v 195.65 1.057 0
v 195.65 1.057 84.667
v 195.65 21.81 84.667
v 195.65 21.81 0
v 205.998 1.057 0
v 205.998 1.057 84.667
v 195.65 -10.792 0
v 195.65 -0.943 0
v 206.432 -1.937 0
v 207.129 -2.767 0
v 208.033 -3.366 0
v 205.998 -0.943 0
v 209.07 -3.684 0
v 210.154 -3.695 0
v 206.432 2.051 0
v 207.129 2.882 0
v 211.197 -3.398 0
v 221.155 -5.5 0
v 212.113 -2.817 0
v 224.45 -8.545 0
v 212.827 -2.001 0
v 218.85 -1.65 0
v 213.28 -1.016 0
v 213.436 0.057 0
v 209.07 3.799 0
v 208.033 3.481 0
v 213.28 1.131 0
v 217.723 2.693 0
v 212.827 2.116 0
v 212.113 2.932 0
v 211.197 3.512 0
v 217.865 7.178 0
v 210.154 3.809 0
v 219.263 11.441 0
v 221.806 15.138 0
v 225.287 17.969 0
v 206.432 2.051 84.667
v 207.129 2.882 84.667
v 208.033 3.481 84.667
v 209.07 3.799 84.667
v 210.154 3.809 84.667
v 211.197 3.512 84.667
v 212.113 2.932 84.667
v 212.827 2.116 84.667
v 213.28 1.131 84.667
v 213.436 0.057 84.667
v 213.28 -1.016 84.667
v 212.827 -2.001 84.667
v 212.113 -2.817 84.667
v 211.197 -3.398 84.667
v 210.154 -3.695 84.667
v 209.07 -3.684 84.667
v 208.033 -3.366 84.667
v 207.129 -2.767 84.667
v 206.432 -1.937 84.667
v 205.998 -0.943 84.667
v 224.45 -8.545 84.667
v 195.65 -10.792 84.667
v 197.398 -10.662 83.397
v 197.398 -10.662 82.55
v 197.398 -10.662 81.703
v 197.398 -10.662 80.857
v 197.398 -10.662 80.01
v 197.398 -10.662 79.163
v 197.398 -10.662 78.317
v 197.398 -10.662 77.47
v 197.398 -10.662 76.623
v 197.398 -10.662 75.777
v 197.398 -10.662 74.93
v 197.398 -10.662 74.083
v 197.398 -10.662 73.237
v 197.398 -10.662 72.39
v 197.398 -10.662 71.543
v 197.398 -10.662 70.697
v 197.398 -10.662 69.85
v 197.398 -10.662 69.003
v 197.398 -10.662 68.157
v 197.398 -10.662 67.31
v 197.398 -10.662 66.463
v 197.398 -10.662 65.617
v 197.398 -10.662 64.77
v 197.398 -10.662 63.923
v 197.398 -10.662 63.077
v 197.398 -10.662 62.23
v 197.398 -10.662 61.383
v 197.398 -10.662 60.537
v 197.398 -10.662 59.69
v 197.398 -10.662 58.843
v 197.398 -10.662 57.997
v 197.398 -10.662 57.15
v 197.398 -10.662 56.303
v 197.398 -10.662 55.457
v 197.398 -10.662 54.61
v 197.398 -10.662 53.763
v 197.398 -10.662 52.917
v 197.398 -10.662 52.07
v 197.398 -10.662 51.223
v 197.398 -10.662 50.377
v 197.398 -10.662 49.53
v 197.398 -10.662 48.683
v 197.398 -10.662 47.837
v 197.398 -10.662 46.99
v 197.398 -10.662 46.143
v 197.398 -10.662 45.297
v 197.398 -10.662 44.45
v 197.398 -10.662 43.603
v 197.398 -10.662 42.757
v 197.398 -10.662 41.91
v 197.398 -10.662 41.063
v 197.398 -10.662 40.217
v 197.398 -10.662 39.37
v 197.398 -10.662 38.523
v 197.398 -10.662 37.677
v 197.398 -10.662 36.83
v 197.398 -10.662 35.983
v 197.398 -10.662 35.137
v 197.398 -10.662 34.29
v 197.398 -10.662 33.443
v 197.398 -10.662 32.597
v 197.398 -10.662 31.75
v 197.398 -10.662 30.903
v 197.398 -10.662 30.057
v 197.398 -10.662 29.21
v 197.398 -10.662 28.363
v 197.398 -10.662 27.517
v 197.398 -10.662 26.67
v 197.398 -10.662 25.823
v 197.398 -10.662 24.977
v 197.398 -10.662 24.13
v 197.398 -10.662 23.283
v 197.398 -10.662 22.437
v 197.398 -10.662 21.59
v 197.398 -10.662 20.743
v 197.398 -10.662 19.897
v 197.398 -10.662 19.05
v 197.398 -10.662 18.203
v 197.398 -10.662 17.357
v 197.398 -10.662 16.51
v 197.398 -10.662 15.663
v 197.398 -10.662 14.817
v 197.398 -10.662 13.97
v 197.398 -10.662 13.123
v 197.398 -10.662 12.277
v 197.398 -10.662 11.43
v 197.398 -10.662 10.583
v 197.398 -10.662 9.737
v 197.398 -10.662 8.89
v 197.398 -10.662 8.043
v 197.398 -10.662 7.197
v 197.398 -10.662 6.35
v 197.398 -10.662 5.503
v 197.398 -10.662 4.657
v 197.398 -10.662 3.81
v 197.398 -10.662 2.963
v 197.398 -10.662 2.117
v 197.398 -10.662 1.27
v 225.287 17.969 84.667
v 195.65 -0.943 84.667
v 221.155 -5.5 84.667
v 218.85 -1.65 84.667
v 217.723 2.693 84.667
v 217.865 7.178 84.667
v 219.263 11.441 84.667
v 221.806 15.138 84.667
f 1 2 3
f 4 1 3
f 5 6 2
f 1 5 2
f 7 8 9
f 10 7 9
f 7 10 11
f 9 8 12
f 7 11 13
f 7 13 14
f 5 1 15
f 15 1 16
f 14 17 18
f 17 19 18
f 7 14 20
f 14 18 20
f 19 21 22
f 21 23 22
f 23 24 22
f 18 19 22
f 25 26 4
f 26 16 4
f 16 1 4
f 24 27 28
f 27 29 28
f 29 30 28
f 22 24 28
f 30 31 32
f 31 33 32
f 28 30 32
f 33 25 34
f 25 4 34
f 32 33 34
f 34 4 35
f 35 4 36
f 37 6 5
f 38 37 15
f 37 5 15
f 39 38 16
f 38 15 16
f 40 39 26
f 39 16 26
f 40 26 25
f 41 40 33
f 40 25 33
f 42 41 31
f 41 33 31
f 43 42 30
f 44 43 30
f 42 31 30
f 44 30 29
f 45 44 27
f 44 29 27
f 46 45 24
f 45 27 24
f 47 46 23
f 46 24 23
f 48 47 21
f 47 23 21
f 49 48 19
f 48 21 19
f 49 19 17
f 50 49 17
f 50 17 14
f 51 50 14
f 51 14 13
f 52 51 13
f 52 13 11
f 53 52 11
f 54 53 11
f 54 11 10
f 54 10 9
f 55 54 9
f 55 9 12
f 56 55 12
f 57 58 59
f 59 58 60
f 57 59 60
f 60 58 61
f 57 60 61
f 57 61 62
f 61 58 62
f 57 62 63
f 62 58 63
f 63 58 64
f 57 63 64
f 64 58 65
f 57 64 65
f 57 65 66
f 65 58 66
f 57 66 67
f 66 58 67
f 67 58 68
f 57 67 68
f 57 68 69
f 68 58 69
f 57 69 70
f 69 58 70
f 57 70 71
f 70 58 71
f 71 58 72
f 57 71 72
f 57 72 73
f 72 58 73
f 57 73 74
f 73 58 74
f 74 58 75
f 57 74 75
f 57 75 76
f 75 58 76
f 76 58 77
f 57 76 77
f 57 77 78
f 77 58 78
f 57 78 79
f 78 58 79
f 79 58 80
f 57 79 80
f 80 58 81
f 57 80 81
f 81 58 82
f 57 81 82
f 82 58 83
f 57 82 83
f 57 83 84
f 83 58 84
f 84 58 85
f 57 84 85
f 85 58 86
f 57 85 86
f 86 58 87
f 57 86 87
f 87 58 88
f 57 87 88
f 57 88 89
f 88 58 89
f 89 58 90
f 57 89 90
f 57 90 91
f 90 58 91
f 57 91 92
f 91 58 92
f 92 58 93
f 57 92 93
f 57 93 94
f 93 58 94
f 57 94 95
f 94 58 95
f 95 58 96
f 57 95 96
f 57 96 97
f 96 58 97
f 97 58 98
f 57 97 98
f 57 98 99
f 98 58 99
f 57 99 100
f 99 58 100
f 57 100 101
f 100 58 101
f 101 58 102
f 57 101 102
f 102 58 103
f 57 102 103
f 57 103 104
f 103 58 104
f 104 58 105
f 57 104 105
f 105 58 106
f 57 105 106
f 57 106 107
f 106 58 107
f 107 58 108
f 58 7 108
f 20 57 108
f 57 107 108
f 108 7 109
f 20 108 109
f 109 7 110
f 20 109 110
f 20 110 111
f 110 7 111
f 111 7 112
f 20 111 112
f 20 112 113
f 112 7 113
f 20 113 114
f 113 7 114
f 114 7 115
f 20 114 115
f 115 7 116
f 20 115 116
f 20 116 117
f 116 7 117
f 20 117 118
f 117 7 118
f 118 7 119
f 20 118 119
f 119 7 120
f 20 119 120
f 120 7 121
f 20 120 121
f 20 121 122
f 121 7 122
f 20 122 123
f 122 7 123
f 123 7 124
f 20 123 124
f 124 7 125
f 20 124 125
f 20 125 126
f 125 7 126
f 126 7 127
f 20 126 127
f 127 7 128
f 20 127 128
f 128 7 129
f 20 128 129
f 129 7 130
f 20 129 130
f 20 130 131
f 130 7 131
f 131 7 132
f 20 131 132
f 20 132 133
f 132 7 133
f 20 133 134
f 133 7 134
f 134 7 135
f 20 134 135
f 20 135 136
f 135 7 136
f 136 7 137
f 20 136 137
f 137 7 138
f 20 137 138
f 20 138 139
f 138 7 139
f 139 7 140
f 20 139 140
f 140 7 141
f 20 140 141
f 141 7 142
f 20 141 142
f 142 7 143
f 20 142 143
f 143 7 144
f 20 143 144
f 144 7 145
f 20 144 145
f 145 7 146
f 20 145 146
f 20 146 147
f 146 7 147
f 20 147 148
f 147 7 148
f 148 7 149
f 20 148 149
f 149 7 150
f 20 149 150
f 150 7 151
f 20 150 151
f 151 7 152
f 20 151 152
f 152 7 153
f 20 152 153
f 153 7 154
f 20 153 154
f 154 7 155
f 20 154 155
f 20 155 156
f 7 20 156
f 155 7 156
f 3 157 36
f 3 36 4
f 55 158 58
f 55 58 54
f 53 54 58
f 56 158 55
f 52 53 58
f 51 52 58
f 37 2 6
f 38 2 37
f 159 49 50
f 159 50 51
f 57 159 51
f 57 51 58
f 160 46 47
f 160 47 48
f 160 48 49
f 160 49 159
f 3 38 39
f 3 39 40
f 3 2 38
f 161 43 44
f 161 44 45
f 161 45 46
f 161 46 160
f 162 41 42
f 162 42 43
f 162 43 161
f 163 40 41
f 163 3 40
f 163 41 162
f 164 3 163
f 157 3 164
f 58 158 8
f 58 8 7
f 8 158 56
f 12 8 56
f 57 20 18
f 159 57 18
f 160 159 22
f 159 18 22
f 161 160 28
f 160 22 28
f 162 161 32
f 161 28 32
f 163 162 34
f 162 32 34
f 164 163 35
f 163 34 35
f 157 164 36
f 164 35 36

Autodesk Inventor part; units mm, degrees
ref_plane "YZ Plane" through (0, 0, 0) normal (1, 0, 0) x (0, 1, 0)
ref_plane "XZ Plane" through (0, 0, 0) normal (0, 1, 0) x (-1, 0, 0)
ref_plane "XY Plane" through (0, 0, 0) normal (0, 0, 1) x (1, 0, 0)
sketch "Sketch2" plane through (0, 0, 0) normal (0, 0, 1) x (1, 0, 0)
  spline S0 degree 5 poles (319.6498, 0.0573) (319.6501, 0.0612) (319.6024, 0.0717) (319.3745, 0.1032) (319.3587, 0.1577) (318.7204, 0.2502) (318.4411, 0.3675) (317.6227, 0.5236) (316.9347, 0.7102) (315.9239, 0.9334) (314.8763, 1.1861) (313.6258, 1.4728) (312.2675, 1.7887) (310.7514, 2.1347) (309.1071, 2.5099) (307.3204, 2.9131) (305.4017, 3.3421) (303.3481, 3.7974) (301.1639, 4.2757) (298.8502, 4.7782) (296.4092, 5.301) (293.8432, 5.8446) (291.1548, 6.4061) (288.3466, 6.9857) (285.4207, 7.5803) (282.3807, 8.1894) (279.2284, 8.8107) (275.968, 9.4437) (272.6016, 10.0865) (269.1329, 10.7361) (265.5656, 11.3942) (261.9019, 12.0551) (258.1469, 12.7207) (254.3029, 13.3883) (250.3742, 14.0555) (246.3647, 14.7217) (242.2776, 15.3854) (238.118, 16.0441) (233.8887, 16.6979) (229.5952, 17.3434) (225.2402, 17.981) (220.8297, 18.6074) (216.3658, 19.2226) (211.8552, 19.8242) (207.3009, 20.4107) (202.7077, 20.9813) (198.0804, 21.5339) (193.4232, 22.0679) (188.7413, 22.58) (184.0389, 23.0713) (179.321, 23.5382) (174.592, 23.982) (169.8567, 24.3971) (165.1201, 24.7874) (160.3872, 25.1472) (155.6604, 25.4776) (150.948, 25.7772) (146.2454, 26.0449) (141.5744, 26.278) (136.9015, 26.4795) (132.2479, 26.6311) (127.6319, 26.7393) (123.054, 26.7999) (118.5202, 26.8147) (114.0397, 26.7815) (109.6094, 26.7031) (105.2517, 26.5723) (100.9331, 26.4088) (96.7495, 26.1663) (92.5147, 25.9483) (88.6376, 25.5343) (84.2302, 25.3974) (81.2071, 24.5612) (76.5297, 24.5259) (73.18, 23.8676) (69.3619, 23.413) (65.9721, 22.8018) (62.3454, 22.244) (59.4319, 21.514) (55.4307, 21.0148) (53.2464, 20.1084) (49.5889, 19.537) (47.2944, 18.6473) (44.3884, 17.909) (41.914, 17.071) (39.4431, 16.2394) (37.1538, 15.3738) (34.9769, 14.4941) (32.9455, 13.5944) (31.0501, 12.6807) (29.2961, 11.7542) (27.6837, 10.8151) (26.2149, 9.8673) (24.8895, 8.9103) (23.7099, 7.9467) (22.6751, 6.976) (21.7868, 6.0004) (21.0458, 5.0186) (20.4526, 4.032) (20.0117, 3.0392) (19.7221, 2.0438) (19.5893, 1.0479) (19.6118, 0.0538) (19.7865, -0.9258) (20.1138, -1.8742) (20.591, -2.7944) (21.2165, -3.6796) (21.9855, -4.5321) (22.8956, -5.3514) (23.9453, -6.1385) (25.1332, -6.8944) (26.4582, -7.6188) (27.9184, -8.3123) (29.5136, -8.9751) (31.2409, -9.6071) (33.0997, -10.2067) (35.0892, -10.7758) (37.2002, -11.3131) (39.4562, -11.8174) (41.7927, -12.2939) (44.3651, -12.7275) (46.7744, -13.1584) (50.0005, -13.481) (52.1533, -13.8927) (55.9371, -14.1294) (58.2153, -14.4717) (61.732, -14.6854) (64.8012, -14.9153) (68.2287, -15.092) (71.6338, -15.2498) (75.1915, -15.3722) (78.8138, -15.4692) (82.5326, -15.5359) (86.3291, -15.5764) (90.2061, -15.5901) (94.1575, -15.5787) (98.1812, -15.5438) (102.2727, -15.4851) (106.4286, -15.4059) (110.6456, -15.3062) (114.9188, -15.1867) (119.2459, -15.0512) (123.6218, -14.8988) (128.0442, -14.7319) (132.5111, -14.552) (137.0141, -14.3592) (141.5621, -14.1606) (146.1675, -13.9403) (150.787, -13.7052) (155.434, -13.4523) (160.0951, -13.1857) (164.7676, -12.9046) (169.4465, -12.6129) (174.1261, -12.3082) (178.8033, -11.9955) (183.4722, -11.6727) (188.1294, -11.3426) (192.7696, -11.0072) (197.3886, -10.6641) (201.9818, -10.3188) (206.5448, -9.9678) (211.0728, -9.6157) (215.5623, -9.2611) (220.0069, -8.9047) (224.4048, -8.5497) (228.7492, -8.193) (233.0373, -7.8393) (237.2647, -7.4865) (241.4259, -7.1353) (245.5189, -6.7884) (249.5374, -6.4441) (253.4791, -6.104) (257.3389, -5.7683) (261.1136, -5.4376) (264.7987, -5.113) (268.3914, -4.7937) (271.8871, -4.4807) (275.2826, -4.1749) (278.5752, -3.8759) (281.7596, -3.585) (284.8354, -3.3021) (287.7962, -3.0278) (290.6419, -2.763) (293.3672, -2.5063) (295.9712, -2.2616) (298.4496, -2.0246) (300.8012, -1.801) (303.0222, -1.5859) (305.1122, -1.3849) (307.0656, -1.194) (308.8864, -1.0166) (310.5623, -0.8504) (312.1091, -0.6993) (313.4945, -0.5587) (314.7717, -0.4371) (315.8415, -0.3205) (316.8737, -0.2329) (317.5782, -0.1363) (318.4119, -0.0906) (318.7016, -0.0103) (319.3493, -0.0034) (319.3699, 0.0485) (319.6005, 0.0494) (319.6495, 0.0534) (319.6498, 0.0573) knots 0 0 0 0 0 0 0.001406 0.002637 0.004353 0.006443 0.008834 0.011487 0.014375 0.017478 0.020781 0.02427 0.027934 0.031762 0.035746 0.039878 0.044151 0.048559 0.053094 0.057751 0.062526 0.067412 0.072404 0.077499 0.082692 0.087977 0.093351 0.098811 0.104351 0.109968 0.115658 0.121418 0.127243 0.133131 0.139077 0.145079 0.151132 0.157233 0.163379 0.169567 0.175793 0.182054 0.188346 0.194667 0.201013 0.20738 0.213767 0.220168 0.226582 0.233004 0.239433 0.245864 0.252294 0.258721 0.265141 0.27155 0.27795 0.284339 0.290715 0.297074 0.303413 0.309725 0.316005 0.32225 0.328456 0.33462 0.340739 0.34681 0.352829 0.358735 0.364639 0.370482 0.376261 0.381971 0.38767 0.393236 0.398773 0.404177 0.409526 0.414755 0.419891 0.424884 0.429828 0.434638 0.439375 0.444 0.448512 0.452907 0.457182 0.461332 0.465356 0.469251 0.473017 0.476652 0.480158 0.48354 0.486805 0.489964 0.493033 0.496034 0.498989 0.501921 0.504852 0.507807 0.510807 0.513873 0.517028 0.520286 0.523658 0.527152 0.530771 0.534516 0.538388 0.542384 0.546503 0.550741 0.555095 0.559563 0.56414 0.568856 0.57364 0.578576 0.583553 0.588622 0.593747 0.598989 0.604262 0.609667 0.615146 0.620698 0.626318 0.632003 0.637751 0.643558 0.649421 0.655338 0.661304 0.667318 0.673375 0.679474 0.685611 0.691783 0.697987 0.704223 0.710491 0.716788 0.723111 0.729457 0.73582 0.742195 0.748576 0.754963 0.761351 0.767737 0.774118 0.780492 0.786854 0.793202 0.799533 0.805843 0.812129 0.818388 0.824617 0.830812 0.836971 0.843089 0.849164 0.855191 0.861169 0.867092 0.872959 0.878764 0.884505 0.890178 0.895778 0.901303 0.906749 0.91211 0.917384 0.922566 0.927651 0.932635 0.937513 0.942281 0.946932 0.951462 0.955865 0.960134 0.964263 0.968244 0.97207 0.975732 0.979219 0.982521 0.985624 0.988511 0.991164 0.993554 0.995643 0.997359 0.998591 1 1 1 1 1 1
  circle A0 centre (79.5135, 4.6359) radius 11.959
  line L0 (79.5135, 4.6359) -> (79.5135, 24.6083) construction
  circle A1 centre (209.6498, 0.0573) radius 3.7859
  line L1 (79.5135, 4.6359) -> (209.6498, 4.6359) construction
  line L2 (319.6498, 0.0573) -> (219.6498, 0.0573) construction
  line L3 (219.6499, 18.7671) -> (219.6499, -8.9327) construction
  line L4 (28.0055, 4.5054) -> (28.0055, -2.4946)
  line L5 (19.627, 1.0326) -> (319.6498, 0.0573) construction
  line L6 (49.7105, 14.4213) -> (55.6079, 14.4213)
  line L7 (49.7104, -8.4915) -> (55.6078, -8.4915)
  line L8 (28.0055, 4.5054) -> (49.7105, 14.4213)
  line L9 (28.0055, -2.4946) -> (49.7104, -8.4915)
  line L10 (55.6079, 14.4213) -> (55.6079, 20.8726)
  line L11 (55.6078, -8.4915) -> (55.6078, -14.1513)
  line L12 (108.6496, 16.398) -> (108.6496, -7.1261)
  line L13 (110.8735, -9.1136) -> (193.8736, 0.2359)
  line L14 (195.6498, 2.2233) -> (195.6498, 7.0486)
  line L15 (193.8736, 9.036) -> (110.8735, 18.3854)
  arc A2 (110.8735, 18.3854) -> (108.6496, 16.398) centre (110.6496, 16.398) ccw
  arc A3 (108.6496, -7.1261) -> (110.8735, -9.1136) centre (110.6496, -7.1261) ccw
  arc A4 (193.8736, 0.2359) -> (195.6498, 2.2233) centre (193.6498, 2.2233) ccw
  arc A5 (195.6498, 7.0486) -> (193.8736, 9.036) centre (193.6498, 7.0486) ccw
  arc A6 (225.2869, 17.9694) -> (224.4503, -8.5446) centre (233.3969, 4.4433) ccw
  line L16 (195.6498, 4.6359) -> (195.6498, -10.7925)
  line L17 (195.6498, 4.6359) -> (195.6498, 21.8096)
  point P0 (0, 0)
  point P1 (319.3573, 0.1272)
  point P2 (318.9918, 0.2142)
  point P3 (318.4802, 0.3354)
  point P4 (317.8238, 0.4911)
  point P5 (317.0222, 0.6801)
  point P6 (316.0769, 0.9024)
  point P7 (314.9885, 1.1568)
  point P8 (313.7582, 1.443)
  point P9 (312.3866, 1.7598)
  point P10 (310.8752, 2.1063)
  point P11 (309.2258, 2.4819)
  point P12 (307.4393, 2.8854)
  point P13 (305.5178, 3.3153)
  point P14 (303.4628, 3.7707)
  point P15 (301.2764, 4.2501)
  point P16 (298.9607, 4.7526)
  point P17 (296.5175, 5.2764)
  point P18 (293.9492, 5.8203)
  point P19 (291.2585, 6.3828)
  point P20 (288.4478, 6.9627)
  point P21 (285.5195, 7.5582)
  point P22 (282.4766, 8.1678)
  point P23 (279.3218, 8.79)
  point P24 (276.0584, 9.4236)
  point P25 (272.6891, 10.0668)
  point P26 (269.2175, 10.7178)
  point P27 (265.6469, 11.3757)
  point P28 (261.9803, 12.0381)
  point P29 (258.2219, 12.7041)
  point P30 (254.3747, 13.3722)
  point P31 (250.4426, 14.0403)
  point P32 (246.4295, 14.7072)
  point P33 (242.339, 15.3714)
  point P34 (238.1756, 16.0311)
  point P35 (233.9428, 16.6851)
  point P36 (229.6454, 17.3316)
  point P37 (220.8723, 18.5967)
  point P38 (216.4049, 19.2123)
  point P39 (211.8901, 19.8144)
  point P40 (207.332, 20.4015)
  point P41 (202.7347, 20.9724)
  point P42 (198.1034, 21.5256)
  point P43 (193.4423, 22.0596)
  point P44 (188.7563, 22.5726)
  point P45 (184.0499, 23.0637)
  point P46 (179.3279, 23.5314)
  point P47 (174.5948, 23.9745)
  point P48 (169.8554, 24.3909)
  point P49 (165.1148, 24.7803)
  point P50 (160.3775, 25.1406)
  point P51 (155.6479, 25.4709)
  point P52 (150.9316, 25.7703)
  point P53 (146.233, 26.0373)
  point P54 (141.557, 26.2707)
  point P55 (136.882, 26.4681)
  point P56 (132.2209, 26.6211)
  point P57 (127.5964, 26.7282)
  point P58 (123.0133, 26.7888)
  point P59 (118.4761, 26.8026)
  point P60 (113.9902, 26.7693)
  point P61 (109.5601, 26.6886)
  point P62 (105.191, 26.5611)
  point P63 (100.8866, 26.3866)
  point P64 (96.6524, 26.1647)
  point P65 (92.4927, 25.8975)
  point P66 (88.4121, 25.5832)
  point P67 (84.4152, 25.2282)
  point P68 (80.9052, 24.7441)
  point P69 (76.6873, 24.3761)
  point P70 (72.9635, 23.8905)
  point P71 (69.3402, 23.3611)
  point P72 (65.8208, 22.7938)
  point P73 (62.4086, 22.1883)
  point P74 (59.107, 21.5464)
  point P75 (52.8493, 20.1606)
  point P76 (49.7105, 19.4213)
  point P77 (47.0737, 18.6507)
  point P78 (44.3741, 17.8542)
  point P79 (41.8034, 17.0322)
  point P80 (39.3638, 16.1874)
  point P81 (37.0583, 15.3213)
  point P82 (34.8884, 14.4363)
  point P83 (32.8568, 13.534)
  point P84 (30.965, 12.6166)
  point P85 (29.2145, 11.686)
  point P86 (27.6071, 10.7437)
  point P87 (26.1443, 9.7921)
  point P88 (24.8269, 8.8324)
  point P89 (23.6566, 7.8664)
  point P90 (22.6336, 6.8953)
  point P91 (21.7591, 5.9209)
  point P92 (21.0334, 4.9441)
  point P93 (20.4571, 3.9661)
  point P94 (20.0308, 2.9875)
  point P95 (19.7539, 2.0098)
  point P96 (19.6496, 0.0573)
  point P97 (19.8205, -0.9033)
  point P98 (20.1376, -1.8357)
  point P99 (20.6002, -2.7402)
  point P100 (21.208, -3.6159)
  point P101 (21.9598, -4.4628)
  point P102 (22.8544, -5.2806)
  point P103 (23.8909, -6.069)
  point P104 (25.0681, -6.8277)
  point P105 (26.3846, -7.5561)
  point P106 (27.8384, -8.2539)
  point P107 (29.4284, -8.9211)
  point P108 (31.1522, -9.5571)
  point P109 (33.0086, -10.1613)
  point P110 (34.9949, -10.734)
  point P111 (37.1093, -11.2746)
  point P112 (39.3497, -11.7828)
  point P113 (41.7134, -12.2586)
  point P114 (44.198, -12.702)
  point P115 (46.8014, -13.1127)
  point P116 (49.7104, -13.4915)
  point P117 (52.3532, -13.8357)
  point P118 (58.3469, -14.4294)
  point P119 (61.5023, -14.6781)
  point P120 (64.7591, -14.8953)
  point P121 (68.1149, -15.0813)
  point P122 (71.5661, -15.237)
  point P123 (75.1094, -15.3627)
  point P124 (78.7418, -15.4596)
  point P125 (82.46, -15.528)
  point P126 (86.2607, -15.5691)
  point P127 (90.14, -15.5838)
  point P128 (94.0946, -15.5733)
  point P129 (98.1212, -15.5388)
  point P130 (102.2159, -15.4812)
  point P131 (106.3751, -15.4023)
  point P132 (110.5952, -15.303)
  point P133 (114.872, -15.1845)
  point P134 (119.2022, -15.0489)
  point P135 (123.5813, -14.8971)
  point P136 (128.006, -14.7306)
  point P137 (132.4718, -14.5509)
  point P138 (136.9748, -14.3598)
  point P139 (141.5285, -14.1576)
  point P140 (146.1365, -13.9383)
  point P141 (150.7679, -13.7022)
  point P142 (155.4191, -13.4499)
  point P143 (160.0853, -13.1829)
  point P144 (164.7617, -12.9024)
  point P145 (169.4444, -12.6099)
  point P146 (174.1283, -12.306)
  point P147 (178.8092, -11.9925)
  point P148 (183.4823, -11.67)
  point P149 (188.1434, -11.34)
  point P150 (192.7877, -11.0037)
  point P151 (197.4106, -10.6614)
  point P152 (202.0079, -10.3149)
  point P153 (206.5747, -9.9645)
  point P154 (211.1069, -9.6117)
  point P155 (215.5999, -9.2568)
  point P156 (220.0489, -8.9007)
  point P157 (228.7987, -8.1885)
  point P158 (233.0906, -7.8339)
  point P159 (237.3214, -7.4808)
  point P160 (241.4866, -7.1298)
  point P161 (245.5828, -6.7821)
  point P162 (249.6052, -6.4377)
  point P163 (253.5502, -6.0972)
  point P164 (257.4136, -5.7612)
  point P165 (261.1915, -5.4303)
  point P166 (264.88, -5.1051)
  point P167 (268.4758, -4.7856)
  point P168 (271.9747, -4.4724)
  point P169 (275.3734, -4.1661)
  point P170 (278.6686, -3.867)
  point P171 (281.8564, -3.5757)
  point P172 (284.9344, -3.2925)
  point P173 (287.8984, -3.018)
  point P174 (290.7463, -2.7525)
  point P175 (293.4745, -2.4963)
  point P176 (296.0806, -2.2503)
  point P177 (298.5616, -2.0142)
  point P178 (300.9151, -1.7892)
  point P179 (303.1387, -1.575)
  point P180 (305.23, -1.3728)
  point P181 (307.1866, -1.1823)
  point P182 (309.007, -1.0041)
  point P183 (310.6885, -0.8385)
  point P184 (312.2302, -0.6861)
  point P185 (313.6297, -0.5472)
  point P186 (314.8861, -0.4221)
  point P187 (315.9976, -0.3108)
  point P188 (316.9636, -0.2139)
  point P189 (317.7826, -0.1314)
  point P190 (318.4537, -0.0636)
  point P191 (318.9766, -0.0108)
  point P192 (319.3503, 0.027)
  point P193 (319.5743, 0.0498)
  point P194 (28.0055, 1.0054)
  point P195 (108.6496, 18.6359)
  point P196 (108.6496, -9.3641)
  point P197 (195.6498, 0.4359)
  point P198 (195.6498, 8.8359)
  point P199 (108.6496, 4.6359)
  dimension "d2" = 300.0001
  dimension "d18" = 7.5719
  dimension "d19" = 110
  dimension "d22" = 100
  dimension "d23" = 7
  dimension "d24" = 5
  dimension "d25" = 5
  dimension "d30" = 28
  dimension "d31" = 8.4
  dimension "d33" = 14
  dimension "d34" = 2
  dimension "d37" = 23.918
  dimension "d44" = 198
  dimension "d46" = 59.8865
extrude "Extrusion7" add sketch "Sketch2" along normal blind 84.6667 contours A6 S0 L16 L14 L17
sketch "Sketch3" plane through (0, 0, 84.6667) normal (0, 0, 1) x (1, 0, 0)
  circle A0 centre (209.6498, 0.0573) radius 3.7859 projected
  line L0 (205.8638, 0.0573) -> (195.6498, 0.0573) construction
  line L1 (195.6498, 21.8096) -> (195.6498, -10.7925) projected
  line L2 (208.6683, 1.0573) -> (192.8453, 1.0573)
  line L3 (192.8453, 1.0573) -> (192.8453, -0.9427)
  line L4 (192.8453, -0.9427) -> (208.6683, -0.9427)
  line L5 (208.6683, -0.9427) -> (208.6683, 1.0573)
  line L6 (208.6683, 1.0573) -> (192.8453, -0.9427) construction
  line L7 (192.8453, 1.0573) -> (208.6683, -0.9427) construction
  point P0 (0, 0)
  point P1 (200.7568, 0.0573)
  dimension "d49" = 15.823
  dimension "d50" = 2
extrude "Extrusion8" cut sketch "Sketch3" against normal blind 132.875 contours L2 L5 L4 A0 | A0 L4 L1 L2 | L1 L4 L3 L2 picked at (207.7385, -0.055)
properties part number "2414 basic aerofoil" material "Polyurethane Foam"
